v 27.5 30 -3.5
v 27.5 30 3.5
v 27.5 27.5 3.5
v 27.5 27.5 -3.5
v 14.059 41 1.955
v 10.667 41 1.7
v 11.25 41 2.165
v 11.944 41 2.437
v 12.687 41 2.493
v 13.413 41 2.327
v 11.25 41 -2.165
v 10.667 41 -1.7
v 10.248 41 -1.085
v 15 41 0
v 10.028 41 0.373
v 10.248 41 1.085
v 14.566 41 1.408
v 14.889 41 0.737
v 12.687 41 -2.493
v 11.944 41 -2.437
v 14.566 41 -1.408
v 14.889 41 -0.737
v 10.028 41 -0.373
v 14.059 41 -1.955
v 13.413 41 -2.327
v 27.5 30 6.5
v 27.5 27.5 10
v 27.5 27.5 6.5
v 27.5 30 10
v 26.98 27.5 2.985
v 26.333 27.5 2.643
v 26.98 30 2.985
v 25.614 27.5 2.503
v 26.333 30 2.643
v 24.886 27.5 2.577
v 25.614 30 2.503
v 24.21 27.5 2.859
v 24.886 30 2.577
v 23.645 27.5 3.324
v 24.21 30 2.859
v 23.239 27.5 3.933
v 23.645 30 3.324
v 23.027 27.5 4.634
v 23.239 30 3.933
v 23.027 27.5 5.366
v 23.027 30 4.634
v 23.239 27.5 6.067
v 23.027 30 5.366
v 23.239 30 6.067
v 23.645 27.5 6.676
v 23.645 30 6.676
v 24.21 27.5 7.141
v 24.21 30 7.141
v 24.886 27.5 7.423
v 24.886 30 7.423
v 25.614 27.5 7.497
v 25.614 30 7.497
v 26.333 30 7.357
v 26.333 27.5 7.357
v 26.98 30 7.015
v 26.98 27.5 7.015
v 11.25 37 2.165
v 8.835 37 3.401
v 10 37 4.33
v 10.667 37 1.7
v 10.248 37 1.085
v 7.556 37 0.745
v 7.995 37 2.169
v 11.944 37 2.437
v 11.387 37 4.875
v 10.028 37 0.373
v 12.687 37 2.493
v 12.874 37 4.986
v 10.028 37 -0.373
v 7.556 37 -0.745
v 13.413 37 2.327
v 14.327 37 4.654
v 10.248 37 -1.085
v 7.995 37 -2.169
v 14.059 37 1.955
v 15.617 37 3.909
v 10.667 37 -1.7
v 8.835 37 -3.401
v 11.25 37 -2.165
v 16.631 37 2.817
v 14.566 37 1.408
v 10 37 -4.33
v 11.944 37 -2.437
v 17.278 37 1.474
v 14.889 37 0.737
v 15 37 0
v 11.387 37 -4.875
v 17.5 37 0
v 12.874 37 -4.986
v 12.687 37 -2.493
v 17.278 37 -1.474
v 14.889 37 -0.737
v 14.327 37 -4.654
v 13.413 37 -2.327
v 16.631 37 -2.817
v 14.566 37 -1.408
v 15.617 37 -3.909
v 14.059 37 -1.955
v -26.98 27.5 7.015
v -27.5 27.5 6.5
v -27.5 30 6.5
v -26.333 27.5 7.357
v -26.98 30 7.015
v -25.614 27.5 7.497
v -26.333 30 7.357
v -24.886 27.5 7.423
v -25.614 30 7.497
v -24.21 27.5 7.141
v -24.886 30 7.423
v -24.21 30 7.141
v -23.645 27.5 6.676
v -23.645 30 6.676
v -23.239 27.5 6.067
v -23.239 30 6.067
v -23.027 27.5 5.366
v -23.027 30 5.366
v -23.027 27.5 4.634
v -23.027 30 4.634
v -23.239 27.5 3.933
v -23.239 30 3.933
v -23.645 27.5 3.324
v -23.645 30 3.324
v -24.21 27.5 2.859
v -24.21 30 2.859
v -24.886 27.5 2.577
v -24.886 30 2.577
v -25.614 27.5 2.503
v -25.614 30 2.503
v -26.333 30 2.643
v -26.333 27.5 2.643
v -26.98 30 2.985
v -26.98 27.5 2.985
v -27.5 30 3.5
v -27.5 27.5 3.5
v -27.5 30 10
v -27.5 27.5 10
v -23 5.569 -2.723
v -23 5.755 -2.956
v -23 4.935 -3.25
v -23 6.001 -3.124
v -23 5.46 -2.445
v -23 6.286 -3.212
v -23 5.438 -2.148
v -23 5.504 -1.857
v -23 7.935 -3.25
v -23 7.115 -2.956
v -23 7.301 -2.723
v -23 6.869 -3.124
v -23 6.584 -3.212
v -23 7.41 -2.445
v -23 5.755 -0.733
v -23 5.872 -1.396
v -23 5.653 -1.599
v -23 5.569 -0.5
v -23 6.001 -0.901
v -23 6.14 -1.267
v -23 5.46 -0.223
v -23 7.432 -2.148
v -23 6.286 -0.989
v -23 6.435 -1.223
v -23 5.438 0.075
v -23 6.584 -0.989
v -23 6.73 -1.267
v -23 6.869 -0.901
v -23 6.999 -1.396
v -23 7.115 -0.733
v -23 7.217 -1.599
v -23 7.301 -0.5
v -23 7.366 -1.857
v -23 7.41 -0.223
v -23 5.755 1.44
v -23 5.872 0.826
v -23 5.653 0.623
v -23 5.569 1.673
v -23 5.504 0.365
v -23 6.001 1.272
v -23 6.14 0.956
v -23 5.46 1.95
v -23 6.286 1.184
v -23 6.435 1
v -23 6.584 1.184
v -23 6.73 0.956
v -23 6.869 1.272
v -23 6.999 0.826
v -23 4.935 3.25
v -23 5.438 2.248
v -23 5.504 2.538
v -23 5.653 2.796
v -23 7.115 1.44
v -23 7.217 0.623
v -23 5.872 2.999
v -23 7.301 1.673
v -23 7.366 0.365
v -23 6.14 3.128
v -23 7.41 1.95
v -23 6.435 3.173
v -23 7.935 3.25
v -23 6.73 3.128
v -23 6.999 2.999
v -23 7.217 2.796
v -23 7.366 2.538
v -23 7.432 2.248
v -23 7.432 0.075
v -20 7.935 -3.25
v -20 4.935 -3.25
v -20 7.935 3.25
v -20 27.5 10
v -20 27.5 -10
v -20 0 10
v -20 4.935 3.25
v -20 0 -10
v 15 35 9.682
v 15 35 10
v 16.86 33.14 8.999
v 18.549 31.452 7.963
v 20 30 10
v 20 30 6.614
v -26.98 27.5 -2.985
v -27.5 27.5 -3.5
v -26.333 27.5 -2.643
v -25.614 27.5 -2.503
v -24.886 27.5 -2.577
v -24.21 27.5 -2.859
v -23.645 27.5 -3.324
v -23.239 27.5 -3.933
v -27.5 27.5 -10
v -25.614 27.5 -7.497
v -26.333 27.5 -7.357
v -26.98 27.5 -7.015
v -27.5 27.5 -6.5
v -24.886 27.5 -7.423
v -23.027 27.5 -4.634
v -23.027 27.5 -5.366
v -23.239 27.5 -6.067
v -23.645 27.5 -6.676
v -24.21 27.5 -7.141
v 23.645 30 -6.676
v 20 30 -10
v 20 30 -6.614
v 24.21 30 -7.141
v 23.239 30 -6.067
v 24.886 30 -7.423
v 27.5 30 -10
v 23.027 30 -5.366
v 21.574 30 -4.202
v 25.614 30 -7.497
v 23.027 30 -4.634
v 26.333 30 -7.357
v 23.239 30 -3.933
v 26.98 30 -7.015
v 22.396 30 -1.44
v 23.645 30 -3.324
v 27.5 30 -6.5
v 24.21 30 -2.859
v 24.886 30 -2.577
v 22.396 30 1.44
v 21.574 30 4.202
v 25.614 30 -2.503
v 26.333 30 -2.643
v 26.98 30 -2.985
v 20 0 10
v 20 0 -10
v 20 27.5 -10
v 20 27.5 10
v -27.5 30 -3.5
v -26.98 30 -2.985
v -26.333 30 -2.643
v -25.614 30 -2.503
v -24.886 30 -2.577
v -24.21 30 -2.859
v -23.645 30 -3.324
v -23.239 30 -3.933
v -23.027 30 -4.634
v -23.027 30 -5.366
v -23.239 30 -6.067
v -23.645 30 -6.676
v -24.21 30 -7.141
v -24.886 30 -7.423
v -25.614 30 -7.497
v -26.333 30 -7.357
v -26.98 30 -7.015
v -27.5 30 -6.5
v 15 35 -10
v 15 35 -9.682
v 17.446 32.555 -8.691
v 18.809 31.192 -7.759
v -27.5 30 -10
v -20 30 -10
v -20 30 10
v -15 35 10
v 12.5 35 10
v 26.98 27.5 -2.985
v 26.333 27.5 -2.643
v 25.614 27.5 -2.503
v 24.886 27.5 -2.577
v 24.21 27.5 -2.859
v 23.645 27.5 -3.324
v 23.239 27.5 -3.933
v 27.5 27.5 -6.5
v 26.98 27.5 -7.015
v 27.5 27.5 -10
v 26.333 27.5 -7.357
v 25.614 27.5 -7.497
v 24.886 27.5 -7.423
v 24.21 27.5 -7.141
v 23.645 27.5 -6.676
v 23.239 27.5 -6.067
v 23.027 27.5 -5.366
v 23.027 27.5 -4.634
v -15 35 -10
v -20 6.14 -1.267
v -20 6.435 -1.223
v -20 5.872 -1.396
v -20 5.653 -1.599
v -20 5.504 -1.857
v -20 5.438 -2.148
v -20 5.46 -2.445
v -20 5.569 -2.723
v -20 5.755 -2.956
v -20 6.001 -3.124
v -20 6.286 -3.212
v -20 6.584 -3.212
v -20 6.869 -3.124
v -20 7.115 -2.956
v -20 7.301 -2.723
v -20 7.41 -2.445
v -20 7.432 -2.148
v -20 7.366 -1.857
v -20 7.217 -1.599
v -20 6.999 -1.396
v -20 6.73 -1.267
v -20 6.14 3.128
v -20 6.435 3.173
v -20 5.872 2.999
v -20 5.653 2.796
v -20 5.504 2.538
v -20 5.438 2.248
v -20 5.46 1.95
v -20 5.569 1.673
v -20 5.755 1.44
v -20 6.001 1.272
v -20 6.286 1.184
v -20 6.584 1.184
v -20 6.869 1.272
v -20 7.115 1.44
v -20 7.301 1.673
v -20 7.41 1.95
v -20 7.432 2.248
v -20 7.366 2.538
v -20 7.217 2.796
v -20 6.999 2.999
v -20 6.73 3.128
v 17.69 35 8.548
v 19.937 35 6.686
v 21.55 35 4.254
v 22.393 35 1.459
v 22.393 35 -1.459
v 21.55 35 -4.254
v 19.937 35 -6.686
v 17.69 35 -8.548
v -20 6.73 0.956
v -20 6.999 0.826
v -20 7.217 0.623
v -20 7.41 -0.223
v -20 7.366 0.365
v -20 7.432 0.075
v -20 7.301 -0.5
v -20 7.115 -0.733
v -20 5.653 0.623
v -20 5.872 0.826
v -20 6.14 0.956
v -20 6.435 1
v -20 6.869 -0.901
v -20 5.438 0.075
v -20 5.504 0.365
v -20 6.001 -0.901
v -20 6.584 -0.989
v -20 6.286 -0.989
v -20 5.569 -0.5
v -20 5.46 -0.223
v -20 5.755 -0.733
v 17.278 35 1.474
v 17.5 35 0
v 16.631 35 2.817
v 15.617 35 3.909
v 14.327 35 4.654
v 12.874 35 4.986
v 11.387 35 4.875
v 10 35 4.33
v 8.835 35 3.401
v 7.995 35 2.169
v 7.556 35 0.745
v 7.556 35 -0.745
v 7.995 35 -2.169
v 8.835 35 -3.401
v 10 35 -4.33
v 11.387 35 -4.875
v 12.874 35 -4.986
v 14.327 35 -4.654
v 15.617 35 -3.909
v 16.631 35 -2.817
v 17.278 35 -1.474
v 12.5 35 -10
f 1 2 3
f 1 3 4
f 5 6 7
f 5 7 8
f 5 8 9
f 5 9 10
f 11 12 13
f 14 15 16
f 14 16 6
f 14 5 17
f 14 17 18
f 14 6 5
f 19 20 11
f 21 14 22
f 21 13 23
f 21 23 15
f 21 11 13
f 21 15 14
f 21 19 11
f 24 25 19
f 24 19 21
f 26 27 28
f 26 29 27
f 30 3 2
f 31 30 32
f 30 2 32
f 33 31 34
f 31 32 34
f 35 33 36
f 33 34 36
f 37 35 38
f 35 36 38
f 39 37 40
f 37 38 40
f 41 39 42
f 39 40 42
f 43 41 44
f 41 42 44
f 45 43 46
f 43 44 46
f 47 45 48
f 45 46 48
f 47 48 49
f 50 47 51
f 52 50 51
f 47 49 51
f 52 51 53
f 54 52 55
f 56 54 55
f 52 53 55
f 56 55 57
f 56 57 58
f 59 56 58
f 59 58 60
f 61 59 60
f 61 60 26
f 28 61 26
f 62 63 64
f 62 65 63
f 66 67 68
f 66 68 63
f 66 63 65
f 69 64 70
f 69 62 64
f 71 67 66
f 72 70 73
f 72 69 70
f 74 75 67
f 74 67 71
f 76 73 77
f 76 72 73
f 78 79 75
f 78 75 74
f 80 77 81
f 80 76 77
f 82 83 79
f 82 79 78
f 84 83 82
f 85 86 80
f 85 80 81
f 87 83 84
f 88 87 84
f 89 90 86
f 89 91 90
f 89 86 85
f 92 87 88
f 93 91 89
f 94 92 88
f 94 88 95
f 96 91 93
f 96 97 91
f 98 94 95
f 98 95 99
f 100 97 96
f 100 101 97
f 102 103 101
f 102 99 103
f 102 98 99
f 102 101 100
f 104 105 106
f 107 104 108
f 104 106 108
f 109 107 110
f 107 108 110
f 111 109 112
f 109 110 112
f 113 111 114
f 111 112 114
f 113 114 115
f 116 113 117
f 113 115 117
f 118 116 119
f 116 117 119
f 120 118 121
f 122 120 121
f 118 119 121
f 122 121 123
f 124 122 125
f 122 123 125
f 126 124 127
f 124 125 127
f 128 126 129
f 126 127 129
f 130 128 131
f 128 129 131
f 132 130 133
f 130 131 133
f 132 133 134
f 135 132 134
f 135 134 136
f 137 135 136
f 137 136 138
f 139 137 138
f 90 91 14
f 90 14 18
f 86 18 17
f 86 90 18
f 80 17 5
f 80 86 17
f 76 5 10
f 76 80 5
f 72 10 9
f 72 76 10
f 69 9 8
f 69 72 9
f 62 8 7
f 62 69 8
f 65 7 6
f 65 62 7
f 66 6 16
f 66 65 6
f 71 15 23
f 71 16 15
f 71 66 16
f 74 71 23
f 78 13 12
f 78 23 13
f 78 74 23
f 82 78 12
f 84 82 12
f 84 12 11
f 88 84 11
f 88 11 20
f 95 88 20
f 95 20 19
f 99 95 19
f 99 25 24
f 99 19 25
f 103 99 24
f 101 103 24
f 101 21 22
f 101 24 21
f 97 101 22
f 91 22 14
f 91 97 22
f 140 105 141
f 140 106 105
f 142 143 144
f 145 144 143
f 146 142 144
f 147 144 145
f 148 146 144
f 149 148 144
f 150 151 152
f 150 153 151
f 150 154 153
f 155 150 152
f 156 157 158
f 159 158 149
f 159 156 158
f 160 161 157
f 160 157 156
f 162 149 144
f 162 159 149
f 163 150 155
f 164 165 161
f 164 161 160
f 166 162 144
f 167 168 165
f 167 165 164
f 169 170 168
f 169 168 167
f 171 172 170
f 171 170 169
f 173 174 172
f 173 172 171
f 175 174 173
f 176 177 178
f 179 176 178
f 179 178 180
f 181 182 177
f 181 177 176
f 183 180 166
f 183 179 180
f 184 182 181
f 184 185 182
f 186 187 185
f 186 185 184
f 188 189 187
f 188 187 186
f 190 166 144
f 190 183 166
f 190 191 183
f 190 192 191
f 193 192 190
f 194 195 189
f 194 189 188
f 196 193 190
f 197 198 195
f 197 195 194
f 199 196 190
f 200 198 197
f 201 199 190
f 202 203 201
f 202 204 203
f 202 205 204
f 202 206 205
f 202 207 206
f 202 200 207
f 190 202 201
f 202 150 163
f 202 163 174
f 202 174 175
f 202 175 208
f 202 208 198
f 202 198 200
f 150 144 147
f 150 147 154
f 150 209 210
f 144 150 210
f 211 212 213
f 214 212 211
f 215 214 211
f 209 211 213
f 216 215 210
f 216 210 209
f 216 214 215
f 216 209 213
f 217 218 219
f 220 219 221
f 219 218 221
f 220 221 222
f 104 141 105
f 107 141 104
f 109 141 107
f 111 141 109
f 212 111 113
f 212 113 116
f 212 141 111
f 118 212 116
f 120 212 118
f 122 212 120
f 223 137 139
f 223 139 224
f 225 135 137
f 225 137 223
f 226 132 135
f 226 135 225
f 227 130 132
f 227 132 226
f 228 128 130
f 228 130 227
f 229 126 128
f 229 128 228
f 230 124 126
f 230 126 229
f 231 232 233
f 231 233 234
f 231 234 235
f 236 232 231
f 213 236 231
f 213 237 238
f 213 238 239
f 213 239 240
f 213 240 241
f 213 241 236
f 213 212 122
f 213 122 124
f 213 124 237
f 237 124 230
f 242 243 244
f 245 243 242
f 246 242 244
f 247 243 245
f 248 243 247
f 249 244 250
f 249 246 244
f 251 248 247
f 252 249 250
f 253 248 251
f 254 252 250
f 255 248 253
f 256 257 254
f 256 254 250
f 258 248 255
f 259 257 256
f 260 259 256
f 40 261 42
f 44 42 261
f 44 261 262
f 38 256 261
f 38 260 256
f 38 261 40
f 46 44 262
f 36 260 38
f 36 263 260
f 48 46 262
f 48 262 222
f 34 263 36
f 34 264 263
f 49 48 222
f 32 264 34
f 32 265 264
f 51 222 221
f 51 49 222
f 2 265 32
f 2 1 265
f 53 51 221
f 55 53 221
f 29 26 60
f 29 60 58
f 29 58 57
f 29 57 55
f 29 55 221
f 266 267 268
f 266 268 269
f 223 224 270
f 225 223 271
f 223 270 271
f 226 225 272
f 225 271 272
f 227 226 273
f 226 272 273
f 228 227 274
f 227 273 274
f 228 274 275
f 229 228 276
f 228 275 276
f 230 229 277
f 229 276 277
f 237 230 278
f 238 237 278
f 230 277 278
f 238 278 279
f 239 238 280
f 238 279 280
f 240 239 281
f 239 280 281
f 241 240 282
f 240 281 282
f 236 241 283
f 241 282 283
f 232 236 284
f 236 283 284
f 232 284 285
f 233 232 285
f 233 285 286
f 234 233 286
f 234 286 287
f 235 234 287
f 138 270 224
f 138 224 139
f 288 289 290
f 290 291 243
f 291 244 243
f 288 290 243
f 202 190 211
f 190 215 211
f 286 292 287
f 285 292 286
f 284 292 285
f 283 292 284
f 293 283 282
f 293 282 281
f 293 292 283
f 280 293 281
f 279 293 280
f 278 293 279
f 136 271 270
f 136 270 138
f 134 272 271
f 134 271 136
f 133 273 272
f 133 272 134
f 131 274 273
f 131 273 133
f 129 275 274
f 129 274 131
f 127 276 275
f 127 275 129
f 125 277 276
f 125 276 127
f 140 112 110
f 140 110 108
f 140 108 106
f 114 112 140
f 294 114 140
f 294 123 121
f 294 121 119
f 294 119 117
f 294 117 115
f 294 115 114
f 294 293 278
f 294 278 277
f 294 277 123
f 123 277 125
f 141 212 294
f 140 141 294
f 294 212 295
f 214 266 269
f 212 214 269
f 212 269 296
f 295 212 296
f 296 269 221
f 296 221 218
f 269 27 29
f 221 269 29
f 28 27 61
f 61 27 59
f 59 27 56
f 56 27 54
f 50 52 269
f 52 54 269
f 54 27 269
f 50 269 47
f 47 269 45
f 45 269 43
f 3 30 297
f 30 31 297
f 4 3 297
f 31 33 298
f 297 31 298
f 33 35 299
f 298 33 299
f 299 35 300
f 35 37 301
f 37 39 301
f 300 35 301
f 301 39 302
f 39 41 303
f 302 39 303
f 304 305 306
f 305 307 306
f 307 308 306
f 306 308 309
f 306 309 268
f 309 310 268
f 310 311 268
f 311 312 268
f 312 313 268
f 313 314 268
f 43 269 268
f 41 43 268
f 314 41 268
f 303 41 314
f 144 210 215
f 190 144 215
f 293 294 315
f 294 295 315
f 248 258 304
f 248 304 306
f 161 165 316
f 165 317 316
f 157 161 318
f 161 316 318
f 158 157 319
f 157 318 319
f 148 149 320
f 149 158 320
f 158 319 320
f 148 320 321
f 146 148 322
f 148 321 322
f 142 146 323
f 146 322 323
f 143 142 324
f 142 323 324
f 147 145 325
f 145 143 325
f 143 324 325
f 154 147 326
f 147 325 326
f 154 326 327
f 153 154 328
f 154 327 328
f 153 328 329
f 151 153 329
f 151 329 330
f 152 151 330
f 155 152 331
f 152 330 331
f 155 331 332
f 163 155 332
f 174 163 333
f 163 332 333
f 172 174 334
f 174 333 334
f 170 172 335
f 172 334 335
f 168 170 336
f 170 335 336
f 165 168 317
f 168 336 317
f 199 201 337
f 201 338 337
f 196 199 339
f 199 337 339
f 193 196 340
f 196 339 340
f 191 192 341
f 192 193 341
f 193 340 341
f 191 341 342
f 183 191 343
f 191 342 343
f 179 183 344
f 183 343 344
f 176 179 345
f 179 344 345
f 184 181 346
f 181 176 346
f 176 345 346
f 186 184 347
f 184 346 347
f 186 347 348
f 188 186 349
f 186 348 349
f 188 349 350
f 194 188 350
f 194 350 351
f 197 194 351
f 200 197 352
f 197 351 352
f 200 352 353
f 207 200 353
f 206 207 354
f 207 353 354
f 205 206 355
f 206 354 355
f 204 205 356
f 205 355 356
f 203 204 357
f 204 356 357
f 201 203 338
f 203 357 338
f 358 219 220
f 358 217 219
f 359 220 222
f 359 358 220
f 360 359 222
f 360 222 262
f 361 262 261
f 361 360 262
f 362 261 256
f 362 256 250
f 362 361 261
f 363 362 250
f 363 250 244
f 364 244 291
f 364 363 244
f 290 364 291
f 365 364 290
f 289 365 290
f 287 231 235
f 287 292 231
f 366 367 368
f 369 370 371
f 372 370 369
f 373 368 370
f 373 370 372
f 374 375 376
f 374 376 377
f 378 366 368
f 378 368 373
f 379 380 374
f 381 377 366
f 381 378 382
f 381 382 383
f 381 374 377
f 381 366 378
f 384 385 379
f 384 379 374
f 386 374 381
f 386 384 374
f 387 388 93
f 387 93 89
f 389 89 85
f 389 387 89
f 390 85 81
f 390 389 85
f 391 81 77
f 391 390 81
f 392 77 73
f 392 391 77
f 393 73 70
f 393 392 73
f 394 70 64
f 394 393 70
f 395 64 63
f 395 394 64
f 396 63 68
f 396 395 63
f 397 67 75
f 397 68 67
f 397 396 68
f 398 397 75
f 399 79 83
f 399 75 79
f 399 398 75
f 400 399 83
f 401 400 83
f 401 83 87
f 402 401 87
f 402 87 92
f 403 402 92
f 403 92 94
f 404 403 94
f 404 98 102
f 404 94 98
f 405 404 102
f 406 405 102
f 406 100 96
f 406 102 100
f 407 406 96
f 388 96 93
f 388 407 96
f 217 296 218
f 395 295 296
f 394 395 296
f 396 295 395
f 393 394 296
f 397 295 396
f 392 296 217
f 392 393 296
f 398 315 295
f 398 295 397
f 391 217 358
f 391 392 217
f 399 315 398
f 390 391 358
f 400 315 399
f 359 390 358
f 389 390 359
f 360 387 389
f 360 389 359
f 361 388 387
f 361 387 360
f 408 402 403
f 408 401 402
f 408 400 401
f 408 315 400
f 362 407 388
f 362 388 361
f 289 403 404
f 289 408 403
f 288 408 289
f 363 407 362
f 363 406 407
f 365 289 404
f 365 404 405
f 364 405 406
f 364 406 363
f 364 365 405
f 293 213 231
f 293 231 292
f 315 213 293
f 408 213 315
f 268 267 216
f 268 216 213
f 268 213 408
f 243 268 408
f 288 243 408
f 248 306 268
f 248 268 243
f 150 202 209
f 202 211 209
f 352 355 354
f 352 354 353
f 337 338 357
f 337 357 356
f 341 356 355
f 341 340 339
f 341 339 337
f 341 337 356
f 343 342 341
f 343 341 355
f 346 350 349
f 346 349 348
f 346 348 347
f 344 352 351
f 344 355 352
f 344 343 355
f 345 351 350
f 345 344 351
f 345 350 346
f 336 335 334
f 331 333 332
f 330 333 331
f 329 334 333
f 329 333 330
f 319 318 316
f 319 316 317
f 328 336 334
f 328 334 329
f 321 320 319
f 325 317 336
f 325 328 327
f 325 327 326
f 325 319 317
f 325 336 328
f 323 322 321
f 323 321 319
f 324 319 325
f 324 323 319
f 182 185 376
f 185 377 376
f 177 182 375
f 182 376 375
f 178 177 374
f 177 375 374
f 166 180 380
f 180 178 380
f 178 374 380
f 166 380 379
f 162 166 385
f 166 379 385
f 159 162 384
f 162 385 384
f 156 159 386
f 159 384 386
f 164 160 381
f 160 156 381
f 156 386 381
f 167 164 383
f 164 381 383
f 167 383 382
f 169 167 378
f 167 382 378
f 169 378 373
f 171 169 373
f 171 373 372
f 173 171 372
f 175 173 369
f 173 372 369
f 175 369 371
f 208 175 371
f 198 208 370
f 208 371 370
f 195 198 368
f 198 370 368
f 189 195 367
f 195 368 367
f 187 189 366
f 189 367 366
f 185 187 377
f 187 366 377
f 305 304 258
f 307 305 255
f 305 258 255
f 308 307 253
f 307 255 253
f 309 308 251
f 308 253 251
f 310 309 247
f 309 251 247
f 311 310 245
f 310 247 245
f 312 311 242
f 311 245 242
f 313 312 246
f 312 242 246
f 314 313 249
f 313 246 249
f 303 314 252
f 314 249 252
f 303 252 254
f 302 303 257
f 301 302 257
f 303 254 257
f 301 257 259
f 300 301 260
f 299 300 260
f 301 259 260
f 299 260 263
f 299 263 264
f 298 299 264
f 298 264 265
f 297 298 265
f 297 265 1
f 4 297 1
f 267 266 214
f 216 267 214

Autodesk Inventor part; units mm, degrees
ref_plane "YZ Plane" through (0, 0, 0) normal (1, 0, 0) x (0, 1, 0)
ref_plane "XZ Plane" through (0, 0, 0) normal (0, 1, 0) x (-1, 0, 0)
ref_plane "XY Plane" through (0, 0, 0) normal (0, 0, 1) x (1, 0, 0)
sketch "Sketch1" plane through (0, 0, 0) normal (0, 1, 0) x (-1, 0, 0)
  line L0 (20, -10) -> (-20, -10)
  line L1 (-20, -10) -> (-20, 10)
  line L2 (-20, 10) -> (20, 10)
  line L3 (20, 10) -> (20, -10)
  line L4 (20, -10) -> (-20, 10) construction
  line L5 (-20, -10) -> (20, 10) construction
  point P0 (0, 0)
  dimension "d0" = 40
  dimension "d1" = 20
extrude "Extrusion1" add sketch "Sketch1" along normal blind 30
sketch "Sketch2" plane through (20, 0, 10) normal (1, 0, 0) x (0, 0, -1)
  line L0 (0, 0) -> (0, 30) projected
  line L1 (20, 30) -> (0, 30)
  line L2 (0, 30) -> (0, 27.5)
  line L3 (0, 27.5) -> (20, 27.5)
  line L4 (20, 27.5) -> (20, 30)
  point P0 (10, 0)
  dimension "d4" = 2.5
extrude "Extrusion2" add sketch "Sketch2" along normal blind 7.5
sketch "Sketch3" plane through (-20, 0, -10) normal (-1, 0, 0) x (0, 0, 1)
  line L0 (20, 0) -> (20, 30) projected
  line L1 (0, 30) -> (20, 30)
  line L2 (20, 30) -> (20, 27.5)
  line L3 (20, 27.5) -> (0, 27.5)
  line L4 (0, 27.5) -> (0, 30)
  point P0 (10, 0)
  dimension "d7" = 2.5
extrude "Extrusion3" add sketch "Sketch3" along normal blind 7.5
sketch "Sketch4" plane through (0, 30, 0) normal (0, 1, 0) x (1, 0, 0)
  line L0 (20, 10) -> (-20, 10)
  line L1 (-20, 10) -> (-20, -10)
  line L2 (-20, -10) -> (20, -10)
  line L3 (20, -10) -> (20, 10)
  line L4 (20, 10) -> (-20, -10) construction
  line L5 (-20, 10) -> (20, -10) construction
  point P0 (0, 0)
extrude "Extrusion4" add sketch "Sketch4" along normal blind 5
chamfer "Chamfer1" distance 5 angle 45 1 edges at (-20, 35, 0)
chamfer "Chamfer2" distance 5 angle 45 1 edges at (20, 35, 0)
sketch "Sketch5" plane through (0, 35, 0) normal (0, 1, 0) x (1, 0, 0)
  circle A0 centre (12.5, 0) radius 10
  line L0 (15, 10) -> (-15, 10) projected
  line L1 (27.5, 10) -> (27.5, -10) projected
  point P0 (0, 0)
  dimension "d18" = 15
extrude "Extrusion5" add sketch "Sketch5" against normal blind 5
sketch "Sketch6" plane through (0, 30, 0) normal (0, 1, 0) x (1, 0, 0)
  circle A0 centre (25.5, -5) radius 2.5
  line L0 (27.5, -10) -> (20, -10) projected
  line L1 (27.5, -10) -> (27.5, 10) projected
  circle A1 centre (25.5, 5) radius 2.5
  line L2 (20, 10) -> (27.5, 10) projected
  point P0 (0, 0)
  dimension "d21" = 5
  dimension "d22" = 5
  dimension "d23" = 2
  dimension "d24" = 5
  dimension "d25" = 5
  dimension "d26" = 2
extrude "Extrusion6" cut sketch "Sketch6" against normal blind 5
sketch "Sketch7" plane through (0, 30, 0) normal (0, 1, 0) x (1, 0, 0)
  circle A0 centre (-25.5, 5) radius 2.5
  circle A1 centre (-25.5, -5) radius 2.5
  line L0 (-27.5, -10) -> (-27.5, 10) projected
  line L1 (-20, -10) -> (-27.5, -10) projected
  line L2 (-27.5, 10) -> (-20, 10) projected
  point P0 (0, 0)
  dimension "d29" = 5
  dimension "d30" = 5
  dimension "d31" = 2
  dimension "d32" = 2
  dimension "d33" = 5
  dimension "d34" = 5
extrude "Extrusion7" cut sketch "Sketch7" against normal blind 5
sketch "Sketch8" plane through (0, 35, 0) normal (0, 1, 0) x (1, 0, 0)
  circle A0 centre (12.5, 0) radius 5
  line L0 (27.5, 3.5) -> (27.5, -3.5) projected
  point P0 (0, 0)
  dimension "d37" = 10
  dimension "d38" = 15
extrude "Extrusion8" add sketch "Sketch8" along normal blind 2
sketch "Sketch9" plane through (12.5, 37, 0) normal (0, 1, 0) x (1, 0, 0)
  circle A0 centre (0, 0) radius 2.5
  point P0 (-12.5, 0)
  dimension "d41" = 5
extrude "Extrusion9" add sketch "Sketch9" along normal blind 4
sketch "Sketch10" plane through (-20, 0, -10) normal (-1, 0, 0) x (0, 0, 1)
  line L0 (13.25, 7.9352) -> (6.75, 7.9352)
  line L1 (6.75, 7.9352) -> (6.75, 4.9352)
  line L2 (6.75, 4.9352) -> (13.25, 4.9352)
  line L3 (13.25, 4.9352) -> (13.25, 7.9352)
  line L4 (13.25, 7.9352) -> (6.75, 4.9352) construction
  line L5 (6.75, 7.9352) -> (13.25, 4.9352) construction
  circle A0 centre (10, 6.4352) radius 1
  circle A1 centre (12.1728, 6.4352) radius 1
  circle A2 centre (7.7773, 6.4352) radius 1
  point P0 (10, 0)
  dimension "d44" = 6.5
  dimension "d45" = 3
  dimension "d46" = 2
  dimension "d47" = 2
  dimension "d48" = 2
extrude "Extrusion10" add sketch "Sketch10" along normal blind 3
sketch "Sketch11" plane through (0, 30, 0) normal (0, 1, 0) x (1, 0, 0)
  point P0 (0, 0)
properties part number "block"
